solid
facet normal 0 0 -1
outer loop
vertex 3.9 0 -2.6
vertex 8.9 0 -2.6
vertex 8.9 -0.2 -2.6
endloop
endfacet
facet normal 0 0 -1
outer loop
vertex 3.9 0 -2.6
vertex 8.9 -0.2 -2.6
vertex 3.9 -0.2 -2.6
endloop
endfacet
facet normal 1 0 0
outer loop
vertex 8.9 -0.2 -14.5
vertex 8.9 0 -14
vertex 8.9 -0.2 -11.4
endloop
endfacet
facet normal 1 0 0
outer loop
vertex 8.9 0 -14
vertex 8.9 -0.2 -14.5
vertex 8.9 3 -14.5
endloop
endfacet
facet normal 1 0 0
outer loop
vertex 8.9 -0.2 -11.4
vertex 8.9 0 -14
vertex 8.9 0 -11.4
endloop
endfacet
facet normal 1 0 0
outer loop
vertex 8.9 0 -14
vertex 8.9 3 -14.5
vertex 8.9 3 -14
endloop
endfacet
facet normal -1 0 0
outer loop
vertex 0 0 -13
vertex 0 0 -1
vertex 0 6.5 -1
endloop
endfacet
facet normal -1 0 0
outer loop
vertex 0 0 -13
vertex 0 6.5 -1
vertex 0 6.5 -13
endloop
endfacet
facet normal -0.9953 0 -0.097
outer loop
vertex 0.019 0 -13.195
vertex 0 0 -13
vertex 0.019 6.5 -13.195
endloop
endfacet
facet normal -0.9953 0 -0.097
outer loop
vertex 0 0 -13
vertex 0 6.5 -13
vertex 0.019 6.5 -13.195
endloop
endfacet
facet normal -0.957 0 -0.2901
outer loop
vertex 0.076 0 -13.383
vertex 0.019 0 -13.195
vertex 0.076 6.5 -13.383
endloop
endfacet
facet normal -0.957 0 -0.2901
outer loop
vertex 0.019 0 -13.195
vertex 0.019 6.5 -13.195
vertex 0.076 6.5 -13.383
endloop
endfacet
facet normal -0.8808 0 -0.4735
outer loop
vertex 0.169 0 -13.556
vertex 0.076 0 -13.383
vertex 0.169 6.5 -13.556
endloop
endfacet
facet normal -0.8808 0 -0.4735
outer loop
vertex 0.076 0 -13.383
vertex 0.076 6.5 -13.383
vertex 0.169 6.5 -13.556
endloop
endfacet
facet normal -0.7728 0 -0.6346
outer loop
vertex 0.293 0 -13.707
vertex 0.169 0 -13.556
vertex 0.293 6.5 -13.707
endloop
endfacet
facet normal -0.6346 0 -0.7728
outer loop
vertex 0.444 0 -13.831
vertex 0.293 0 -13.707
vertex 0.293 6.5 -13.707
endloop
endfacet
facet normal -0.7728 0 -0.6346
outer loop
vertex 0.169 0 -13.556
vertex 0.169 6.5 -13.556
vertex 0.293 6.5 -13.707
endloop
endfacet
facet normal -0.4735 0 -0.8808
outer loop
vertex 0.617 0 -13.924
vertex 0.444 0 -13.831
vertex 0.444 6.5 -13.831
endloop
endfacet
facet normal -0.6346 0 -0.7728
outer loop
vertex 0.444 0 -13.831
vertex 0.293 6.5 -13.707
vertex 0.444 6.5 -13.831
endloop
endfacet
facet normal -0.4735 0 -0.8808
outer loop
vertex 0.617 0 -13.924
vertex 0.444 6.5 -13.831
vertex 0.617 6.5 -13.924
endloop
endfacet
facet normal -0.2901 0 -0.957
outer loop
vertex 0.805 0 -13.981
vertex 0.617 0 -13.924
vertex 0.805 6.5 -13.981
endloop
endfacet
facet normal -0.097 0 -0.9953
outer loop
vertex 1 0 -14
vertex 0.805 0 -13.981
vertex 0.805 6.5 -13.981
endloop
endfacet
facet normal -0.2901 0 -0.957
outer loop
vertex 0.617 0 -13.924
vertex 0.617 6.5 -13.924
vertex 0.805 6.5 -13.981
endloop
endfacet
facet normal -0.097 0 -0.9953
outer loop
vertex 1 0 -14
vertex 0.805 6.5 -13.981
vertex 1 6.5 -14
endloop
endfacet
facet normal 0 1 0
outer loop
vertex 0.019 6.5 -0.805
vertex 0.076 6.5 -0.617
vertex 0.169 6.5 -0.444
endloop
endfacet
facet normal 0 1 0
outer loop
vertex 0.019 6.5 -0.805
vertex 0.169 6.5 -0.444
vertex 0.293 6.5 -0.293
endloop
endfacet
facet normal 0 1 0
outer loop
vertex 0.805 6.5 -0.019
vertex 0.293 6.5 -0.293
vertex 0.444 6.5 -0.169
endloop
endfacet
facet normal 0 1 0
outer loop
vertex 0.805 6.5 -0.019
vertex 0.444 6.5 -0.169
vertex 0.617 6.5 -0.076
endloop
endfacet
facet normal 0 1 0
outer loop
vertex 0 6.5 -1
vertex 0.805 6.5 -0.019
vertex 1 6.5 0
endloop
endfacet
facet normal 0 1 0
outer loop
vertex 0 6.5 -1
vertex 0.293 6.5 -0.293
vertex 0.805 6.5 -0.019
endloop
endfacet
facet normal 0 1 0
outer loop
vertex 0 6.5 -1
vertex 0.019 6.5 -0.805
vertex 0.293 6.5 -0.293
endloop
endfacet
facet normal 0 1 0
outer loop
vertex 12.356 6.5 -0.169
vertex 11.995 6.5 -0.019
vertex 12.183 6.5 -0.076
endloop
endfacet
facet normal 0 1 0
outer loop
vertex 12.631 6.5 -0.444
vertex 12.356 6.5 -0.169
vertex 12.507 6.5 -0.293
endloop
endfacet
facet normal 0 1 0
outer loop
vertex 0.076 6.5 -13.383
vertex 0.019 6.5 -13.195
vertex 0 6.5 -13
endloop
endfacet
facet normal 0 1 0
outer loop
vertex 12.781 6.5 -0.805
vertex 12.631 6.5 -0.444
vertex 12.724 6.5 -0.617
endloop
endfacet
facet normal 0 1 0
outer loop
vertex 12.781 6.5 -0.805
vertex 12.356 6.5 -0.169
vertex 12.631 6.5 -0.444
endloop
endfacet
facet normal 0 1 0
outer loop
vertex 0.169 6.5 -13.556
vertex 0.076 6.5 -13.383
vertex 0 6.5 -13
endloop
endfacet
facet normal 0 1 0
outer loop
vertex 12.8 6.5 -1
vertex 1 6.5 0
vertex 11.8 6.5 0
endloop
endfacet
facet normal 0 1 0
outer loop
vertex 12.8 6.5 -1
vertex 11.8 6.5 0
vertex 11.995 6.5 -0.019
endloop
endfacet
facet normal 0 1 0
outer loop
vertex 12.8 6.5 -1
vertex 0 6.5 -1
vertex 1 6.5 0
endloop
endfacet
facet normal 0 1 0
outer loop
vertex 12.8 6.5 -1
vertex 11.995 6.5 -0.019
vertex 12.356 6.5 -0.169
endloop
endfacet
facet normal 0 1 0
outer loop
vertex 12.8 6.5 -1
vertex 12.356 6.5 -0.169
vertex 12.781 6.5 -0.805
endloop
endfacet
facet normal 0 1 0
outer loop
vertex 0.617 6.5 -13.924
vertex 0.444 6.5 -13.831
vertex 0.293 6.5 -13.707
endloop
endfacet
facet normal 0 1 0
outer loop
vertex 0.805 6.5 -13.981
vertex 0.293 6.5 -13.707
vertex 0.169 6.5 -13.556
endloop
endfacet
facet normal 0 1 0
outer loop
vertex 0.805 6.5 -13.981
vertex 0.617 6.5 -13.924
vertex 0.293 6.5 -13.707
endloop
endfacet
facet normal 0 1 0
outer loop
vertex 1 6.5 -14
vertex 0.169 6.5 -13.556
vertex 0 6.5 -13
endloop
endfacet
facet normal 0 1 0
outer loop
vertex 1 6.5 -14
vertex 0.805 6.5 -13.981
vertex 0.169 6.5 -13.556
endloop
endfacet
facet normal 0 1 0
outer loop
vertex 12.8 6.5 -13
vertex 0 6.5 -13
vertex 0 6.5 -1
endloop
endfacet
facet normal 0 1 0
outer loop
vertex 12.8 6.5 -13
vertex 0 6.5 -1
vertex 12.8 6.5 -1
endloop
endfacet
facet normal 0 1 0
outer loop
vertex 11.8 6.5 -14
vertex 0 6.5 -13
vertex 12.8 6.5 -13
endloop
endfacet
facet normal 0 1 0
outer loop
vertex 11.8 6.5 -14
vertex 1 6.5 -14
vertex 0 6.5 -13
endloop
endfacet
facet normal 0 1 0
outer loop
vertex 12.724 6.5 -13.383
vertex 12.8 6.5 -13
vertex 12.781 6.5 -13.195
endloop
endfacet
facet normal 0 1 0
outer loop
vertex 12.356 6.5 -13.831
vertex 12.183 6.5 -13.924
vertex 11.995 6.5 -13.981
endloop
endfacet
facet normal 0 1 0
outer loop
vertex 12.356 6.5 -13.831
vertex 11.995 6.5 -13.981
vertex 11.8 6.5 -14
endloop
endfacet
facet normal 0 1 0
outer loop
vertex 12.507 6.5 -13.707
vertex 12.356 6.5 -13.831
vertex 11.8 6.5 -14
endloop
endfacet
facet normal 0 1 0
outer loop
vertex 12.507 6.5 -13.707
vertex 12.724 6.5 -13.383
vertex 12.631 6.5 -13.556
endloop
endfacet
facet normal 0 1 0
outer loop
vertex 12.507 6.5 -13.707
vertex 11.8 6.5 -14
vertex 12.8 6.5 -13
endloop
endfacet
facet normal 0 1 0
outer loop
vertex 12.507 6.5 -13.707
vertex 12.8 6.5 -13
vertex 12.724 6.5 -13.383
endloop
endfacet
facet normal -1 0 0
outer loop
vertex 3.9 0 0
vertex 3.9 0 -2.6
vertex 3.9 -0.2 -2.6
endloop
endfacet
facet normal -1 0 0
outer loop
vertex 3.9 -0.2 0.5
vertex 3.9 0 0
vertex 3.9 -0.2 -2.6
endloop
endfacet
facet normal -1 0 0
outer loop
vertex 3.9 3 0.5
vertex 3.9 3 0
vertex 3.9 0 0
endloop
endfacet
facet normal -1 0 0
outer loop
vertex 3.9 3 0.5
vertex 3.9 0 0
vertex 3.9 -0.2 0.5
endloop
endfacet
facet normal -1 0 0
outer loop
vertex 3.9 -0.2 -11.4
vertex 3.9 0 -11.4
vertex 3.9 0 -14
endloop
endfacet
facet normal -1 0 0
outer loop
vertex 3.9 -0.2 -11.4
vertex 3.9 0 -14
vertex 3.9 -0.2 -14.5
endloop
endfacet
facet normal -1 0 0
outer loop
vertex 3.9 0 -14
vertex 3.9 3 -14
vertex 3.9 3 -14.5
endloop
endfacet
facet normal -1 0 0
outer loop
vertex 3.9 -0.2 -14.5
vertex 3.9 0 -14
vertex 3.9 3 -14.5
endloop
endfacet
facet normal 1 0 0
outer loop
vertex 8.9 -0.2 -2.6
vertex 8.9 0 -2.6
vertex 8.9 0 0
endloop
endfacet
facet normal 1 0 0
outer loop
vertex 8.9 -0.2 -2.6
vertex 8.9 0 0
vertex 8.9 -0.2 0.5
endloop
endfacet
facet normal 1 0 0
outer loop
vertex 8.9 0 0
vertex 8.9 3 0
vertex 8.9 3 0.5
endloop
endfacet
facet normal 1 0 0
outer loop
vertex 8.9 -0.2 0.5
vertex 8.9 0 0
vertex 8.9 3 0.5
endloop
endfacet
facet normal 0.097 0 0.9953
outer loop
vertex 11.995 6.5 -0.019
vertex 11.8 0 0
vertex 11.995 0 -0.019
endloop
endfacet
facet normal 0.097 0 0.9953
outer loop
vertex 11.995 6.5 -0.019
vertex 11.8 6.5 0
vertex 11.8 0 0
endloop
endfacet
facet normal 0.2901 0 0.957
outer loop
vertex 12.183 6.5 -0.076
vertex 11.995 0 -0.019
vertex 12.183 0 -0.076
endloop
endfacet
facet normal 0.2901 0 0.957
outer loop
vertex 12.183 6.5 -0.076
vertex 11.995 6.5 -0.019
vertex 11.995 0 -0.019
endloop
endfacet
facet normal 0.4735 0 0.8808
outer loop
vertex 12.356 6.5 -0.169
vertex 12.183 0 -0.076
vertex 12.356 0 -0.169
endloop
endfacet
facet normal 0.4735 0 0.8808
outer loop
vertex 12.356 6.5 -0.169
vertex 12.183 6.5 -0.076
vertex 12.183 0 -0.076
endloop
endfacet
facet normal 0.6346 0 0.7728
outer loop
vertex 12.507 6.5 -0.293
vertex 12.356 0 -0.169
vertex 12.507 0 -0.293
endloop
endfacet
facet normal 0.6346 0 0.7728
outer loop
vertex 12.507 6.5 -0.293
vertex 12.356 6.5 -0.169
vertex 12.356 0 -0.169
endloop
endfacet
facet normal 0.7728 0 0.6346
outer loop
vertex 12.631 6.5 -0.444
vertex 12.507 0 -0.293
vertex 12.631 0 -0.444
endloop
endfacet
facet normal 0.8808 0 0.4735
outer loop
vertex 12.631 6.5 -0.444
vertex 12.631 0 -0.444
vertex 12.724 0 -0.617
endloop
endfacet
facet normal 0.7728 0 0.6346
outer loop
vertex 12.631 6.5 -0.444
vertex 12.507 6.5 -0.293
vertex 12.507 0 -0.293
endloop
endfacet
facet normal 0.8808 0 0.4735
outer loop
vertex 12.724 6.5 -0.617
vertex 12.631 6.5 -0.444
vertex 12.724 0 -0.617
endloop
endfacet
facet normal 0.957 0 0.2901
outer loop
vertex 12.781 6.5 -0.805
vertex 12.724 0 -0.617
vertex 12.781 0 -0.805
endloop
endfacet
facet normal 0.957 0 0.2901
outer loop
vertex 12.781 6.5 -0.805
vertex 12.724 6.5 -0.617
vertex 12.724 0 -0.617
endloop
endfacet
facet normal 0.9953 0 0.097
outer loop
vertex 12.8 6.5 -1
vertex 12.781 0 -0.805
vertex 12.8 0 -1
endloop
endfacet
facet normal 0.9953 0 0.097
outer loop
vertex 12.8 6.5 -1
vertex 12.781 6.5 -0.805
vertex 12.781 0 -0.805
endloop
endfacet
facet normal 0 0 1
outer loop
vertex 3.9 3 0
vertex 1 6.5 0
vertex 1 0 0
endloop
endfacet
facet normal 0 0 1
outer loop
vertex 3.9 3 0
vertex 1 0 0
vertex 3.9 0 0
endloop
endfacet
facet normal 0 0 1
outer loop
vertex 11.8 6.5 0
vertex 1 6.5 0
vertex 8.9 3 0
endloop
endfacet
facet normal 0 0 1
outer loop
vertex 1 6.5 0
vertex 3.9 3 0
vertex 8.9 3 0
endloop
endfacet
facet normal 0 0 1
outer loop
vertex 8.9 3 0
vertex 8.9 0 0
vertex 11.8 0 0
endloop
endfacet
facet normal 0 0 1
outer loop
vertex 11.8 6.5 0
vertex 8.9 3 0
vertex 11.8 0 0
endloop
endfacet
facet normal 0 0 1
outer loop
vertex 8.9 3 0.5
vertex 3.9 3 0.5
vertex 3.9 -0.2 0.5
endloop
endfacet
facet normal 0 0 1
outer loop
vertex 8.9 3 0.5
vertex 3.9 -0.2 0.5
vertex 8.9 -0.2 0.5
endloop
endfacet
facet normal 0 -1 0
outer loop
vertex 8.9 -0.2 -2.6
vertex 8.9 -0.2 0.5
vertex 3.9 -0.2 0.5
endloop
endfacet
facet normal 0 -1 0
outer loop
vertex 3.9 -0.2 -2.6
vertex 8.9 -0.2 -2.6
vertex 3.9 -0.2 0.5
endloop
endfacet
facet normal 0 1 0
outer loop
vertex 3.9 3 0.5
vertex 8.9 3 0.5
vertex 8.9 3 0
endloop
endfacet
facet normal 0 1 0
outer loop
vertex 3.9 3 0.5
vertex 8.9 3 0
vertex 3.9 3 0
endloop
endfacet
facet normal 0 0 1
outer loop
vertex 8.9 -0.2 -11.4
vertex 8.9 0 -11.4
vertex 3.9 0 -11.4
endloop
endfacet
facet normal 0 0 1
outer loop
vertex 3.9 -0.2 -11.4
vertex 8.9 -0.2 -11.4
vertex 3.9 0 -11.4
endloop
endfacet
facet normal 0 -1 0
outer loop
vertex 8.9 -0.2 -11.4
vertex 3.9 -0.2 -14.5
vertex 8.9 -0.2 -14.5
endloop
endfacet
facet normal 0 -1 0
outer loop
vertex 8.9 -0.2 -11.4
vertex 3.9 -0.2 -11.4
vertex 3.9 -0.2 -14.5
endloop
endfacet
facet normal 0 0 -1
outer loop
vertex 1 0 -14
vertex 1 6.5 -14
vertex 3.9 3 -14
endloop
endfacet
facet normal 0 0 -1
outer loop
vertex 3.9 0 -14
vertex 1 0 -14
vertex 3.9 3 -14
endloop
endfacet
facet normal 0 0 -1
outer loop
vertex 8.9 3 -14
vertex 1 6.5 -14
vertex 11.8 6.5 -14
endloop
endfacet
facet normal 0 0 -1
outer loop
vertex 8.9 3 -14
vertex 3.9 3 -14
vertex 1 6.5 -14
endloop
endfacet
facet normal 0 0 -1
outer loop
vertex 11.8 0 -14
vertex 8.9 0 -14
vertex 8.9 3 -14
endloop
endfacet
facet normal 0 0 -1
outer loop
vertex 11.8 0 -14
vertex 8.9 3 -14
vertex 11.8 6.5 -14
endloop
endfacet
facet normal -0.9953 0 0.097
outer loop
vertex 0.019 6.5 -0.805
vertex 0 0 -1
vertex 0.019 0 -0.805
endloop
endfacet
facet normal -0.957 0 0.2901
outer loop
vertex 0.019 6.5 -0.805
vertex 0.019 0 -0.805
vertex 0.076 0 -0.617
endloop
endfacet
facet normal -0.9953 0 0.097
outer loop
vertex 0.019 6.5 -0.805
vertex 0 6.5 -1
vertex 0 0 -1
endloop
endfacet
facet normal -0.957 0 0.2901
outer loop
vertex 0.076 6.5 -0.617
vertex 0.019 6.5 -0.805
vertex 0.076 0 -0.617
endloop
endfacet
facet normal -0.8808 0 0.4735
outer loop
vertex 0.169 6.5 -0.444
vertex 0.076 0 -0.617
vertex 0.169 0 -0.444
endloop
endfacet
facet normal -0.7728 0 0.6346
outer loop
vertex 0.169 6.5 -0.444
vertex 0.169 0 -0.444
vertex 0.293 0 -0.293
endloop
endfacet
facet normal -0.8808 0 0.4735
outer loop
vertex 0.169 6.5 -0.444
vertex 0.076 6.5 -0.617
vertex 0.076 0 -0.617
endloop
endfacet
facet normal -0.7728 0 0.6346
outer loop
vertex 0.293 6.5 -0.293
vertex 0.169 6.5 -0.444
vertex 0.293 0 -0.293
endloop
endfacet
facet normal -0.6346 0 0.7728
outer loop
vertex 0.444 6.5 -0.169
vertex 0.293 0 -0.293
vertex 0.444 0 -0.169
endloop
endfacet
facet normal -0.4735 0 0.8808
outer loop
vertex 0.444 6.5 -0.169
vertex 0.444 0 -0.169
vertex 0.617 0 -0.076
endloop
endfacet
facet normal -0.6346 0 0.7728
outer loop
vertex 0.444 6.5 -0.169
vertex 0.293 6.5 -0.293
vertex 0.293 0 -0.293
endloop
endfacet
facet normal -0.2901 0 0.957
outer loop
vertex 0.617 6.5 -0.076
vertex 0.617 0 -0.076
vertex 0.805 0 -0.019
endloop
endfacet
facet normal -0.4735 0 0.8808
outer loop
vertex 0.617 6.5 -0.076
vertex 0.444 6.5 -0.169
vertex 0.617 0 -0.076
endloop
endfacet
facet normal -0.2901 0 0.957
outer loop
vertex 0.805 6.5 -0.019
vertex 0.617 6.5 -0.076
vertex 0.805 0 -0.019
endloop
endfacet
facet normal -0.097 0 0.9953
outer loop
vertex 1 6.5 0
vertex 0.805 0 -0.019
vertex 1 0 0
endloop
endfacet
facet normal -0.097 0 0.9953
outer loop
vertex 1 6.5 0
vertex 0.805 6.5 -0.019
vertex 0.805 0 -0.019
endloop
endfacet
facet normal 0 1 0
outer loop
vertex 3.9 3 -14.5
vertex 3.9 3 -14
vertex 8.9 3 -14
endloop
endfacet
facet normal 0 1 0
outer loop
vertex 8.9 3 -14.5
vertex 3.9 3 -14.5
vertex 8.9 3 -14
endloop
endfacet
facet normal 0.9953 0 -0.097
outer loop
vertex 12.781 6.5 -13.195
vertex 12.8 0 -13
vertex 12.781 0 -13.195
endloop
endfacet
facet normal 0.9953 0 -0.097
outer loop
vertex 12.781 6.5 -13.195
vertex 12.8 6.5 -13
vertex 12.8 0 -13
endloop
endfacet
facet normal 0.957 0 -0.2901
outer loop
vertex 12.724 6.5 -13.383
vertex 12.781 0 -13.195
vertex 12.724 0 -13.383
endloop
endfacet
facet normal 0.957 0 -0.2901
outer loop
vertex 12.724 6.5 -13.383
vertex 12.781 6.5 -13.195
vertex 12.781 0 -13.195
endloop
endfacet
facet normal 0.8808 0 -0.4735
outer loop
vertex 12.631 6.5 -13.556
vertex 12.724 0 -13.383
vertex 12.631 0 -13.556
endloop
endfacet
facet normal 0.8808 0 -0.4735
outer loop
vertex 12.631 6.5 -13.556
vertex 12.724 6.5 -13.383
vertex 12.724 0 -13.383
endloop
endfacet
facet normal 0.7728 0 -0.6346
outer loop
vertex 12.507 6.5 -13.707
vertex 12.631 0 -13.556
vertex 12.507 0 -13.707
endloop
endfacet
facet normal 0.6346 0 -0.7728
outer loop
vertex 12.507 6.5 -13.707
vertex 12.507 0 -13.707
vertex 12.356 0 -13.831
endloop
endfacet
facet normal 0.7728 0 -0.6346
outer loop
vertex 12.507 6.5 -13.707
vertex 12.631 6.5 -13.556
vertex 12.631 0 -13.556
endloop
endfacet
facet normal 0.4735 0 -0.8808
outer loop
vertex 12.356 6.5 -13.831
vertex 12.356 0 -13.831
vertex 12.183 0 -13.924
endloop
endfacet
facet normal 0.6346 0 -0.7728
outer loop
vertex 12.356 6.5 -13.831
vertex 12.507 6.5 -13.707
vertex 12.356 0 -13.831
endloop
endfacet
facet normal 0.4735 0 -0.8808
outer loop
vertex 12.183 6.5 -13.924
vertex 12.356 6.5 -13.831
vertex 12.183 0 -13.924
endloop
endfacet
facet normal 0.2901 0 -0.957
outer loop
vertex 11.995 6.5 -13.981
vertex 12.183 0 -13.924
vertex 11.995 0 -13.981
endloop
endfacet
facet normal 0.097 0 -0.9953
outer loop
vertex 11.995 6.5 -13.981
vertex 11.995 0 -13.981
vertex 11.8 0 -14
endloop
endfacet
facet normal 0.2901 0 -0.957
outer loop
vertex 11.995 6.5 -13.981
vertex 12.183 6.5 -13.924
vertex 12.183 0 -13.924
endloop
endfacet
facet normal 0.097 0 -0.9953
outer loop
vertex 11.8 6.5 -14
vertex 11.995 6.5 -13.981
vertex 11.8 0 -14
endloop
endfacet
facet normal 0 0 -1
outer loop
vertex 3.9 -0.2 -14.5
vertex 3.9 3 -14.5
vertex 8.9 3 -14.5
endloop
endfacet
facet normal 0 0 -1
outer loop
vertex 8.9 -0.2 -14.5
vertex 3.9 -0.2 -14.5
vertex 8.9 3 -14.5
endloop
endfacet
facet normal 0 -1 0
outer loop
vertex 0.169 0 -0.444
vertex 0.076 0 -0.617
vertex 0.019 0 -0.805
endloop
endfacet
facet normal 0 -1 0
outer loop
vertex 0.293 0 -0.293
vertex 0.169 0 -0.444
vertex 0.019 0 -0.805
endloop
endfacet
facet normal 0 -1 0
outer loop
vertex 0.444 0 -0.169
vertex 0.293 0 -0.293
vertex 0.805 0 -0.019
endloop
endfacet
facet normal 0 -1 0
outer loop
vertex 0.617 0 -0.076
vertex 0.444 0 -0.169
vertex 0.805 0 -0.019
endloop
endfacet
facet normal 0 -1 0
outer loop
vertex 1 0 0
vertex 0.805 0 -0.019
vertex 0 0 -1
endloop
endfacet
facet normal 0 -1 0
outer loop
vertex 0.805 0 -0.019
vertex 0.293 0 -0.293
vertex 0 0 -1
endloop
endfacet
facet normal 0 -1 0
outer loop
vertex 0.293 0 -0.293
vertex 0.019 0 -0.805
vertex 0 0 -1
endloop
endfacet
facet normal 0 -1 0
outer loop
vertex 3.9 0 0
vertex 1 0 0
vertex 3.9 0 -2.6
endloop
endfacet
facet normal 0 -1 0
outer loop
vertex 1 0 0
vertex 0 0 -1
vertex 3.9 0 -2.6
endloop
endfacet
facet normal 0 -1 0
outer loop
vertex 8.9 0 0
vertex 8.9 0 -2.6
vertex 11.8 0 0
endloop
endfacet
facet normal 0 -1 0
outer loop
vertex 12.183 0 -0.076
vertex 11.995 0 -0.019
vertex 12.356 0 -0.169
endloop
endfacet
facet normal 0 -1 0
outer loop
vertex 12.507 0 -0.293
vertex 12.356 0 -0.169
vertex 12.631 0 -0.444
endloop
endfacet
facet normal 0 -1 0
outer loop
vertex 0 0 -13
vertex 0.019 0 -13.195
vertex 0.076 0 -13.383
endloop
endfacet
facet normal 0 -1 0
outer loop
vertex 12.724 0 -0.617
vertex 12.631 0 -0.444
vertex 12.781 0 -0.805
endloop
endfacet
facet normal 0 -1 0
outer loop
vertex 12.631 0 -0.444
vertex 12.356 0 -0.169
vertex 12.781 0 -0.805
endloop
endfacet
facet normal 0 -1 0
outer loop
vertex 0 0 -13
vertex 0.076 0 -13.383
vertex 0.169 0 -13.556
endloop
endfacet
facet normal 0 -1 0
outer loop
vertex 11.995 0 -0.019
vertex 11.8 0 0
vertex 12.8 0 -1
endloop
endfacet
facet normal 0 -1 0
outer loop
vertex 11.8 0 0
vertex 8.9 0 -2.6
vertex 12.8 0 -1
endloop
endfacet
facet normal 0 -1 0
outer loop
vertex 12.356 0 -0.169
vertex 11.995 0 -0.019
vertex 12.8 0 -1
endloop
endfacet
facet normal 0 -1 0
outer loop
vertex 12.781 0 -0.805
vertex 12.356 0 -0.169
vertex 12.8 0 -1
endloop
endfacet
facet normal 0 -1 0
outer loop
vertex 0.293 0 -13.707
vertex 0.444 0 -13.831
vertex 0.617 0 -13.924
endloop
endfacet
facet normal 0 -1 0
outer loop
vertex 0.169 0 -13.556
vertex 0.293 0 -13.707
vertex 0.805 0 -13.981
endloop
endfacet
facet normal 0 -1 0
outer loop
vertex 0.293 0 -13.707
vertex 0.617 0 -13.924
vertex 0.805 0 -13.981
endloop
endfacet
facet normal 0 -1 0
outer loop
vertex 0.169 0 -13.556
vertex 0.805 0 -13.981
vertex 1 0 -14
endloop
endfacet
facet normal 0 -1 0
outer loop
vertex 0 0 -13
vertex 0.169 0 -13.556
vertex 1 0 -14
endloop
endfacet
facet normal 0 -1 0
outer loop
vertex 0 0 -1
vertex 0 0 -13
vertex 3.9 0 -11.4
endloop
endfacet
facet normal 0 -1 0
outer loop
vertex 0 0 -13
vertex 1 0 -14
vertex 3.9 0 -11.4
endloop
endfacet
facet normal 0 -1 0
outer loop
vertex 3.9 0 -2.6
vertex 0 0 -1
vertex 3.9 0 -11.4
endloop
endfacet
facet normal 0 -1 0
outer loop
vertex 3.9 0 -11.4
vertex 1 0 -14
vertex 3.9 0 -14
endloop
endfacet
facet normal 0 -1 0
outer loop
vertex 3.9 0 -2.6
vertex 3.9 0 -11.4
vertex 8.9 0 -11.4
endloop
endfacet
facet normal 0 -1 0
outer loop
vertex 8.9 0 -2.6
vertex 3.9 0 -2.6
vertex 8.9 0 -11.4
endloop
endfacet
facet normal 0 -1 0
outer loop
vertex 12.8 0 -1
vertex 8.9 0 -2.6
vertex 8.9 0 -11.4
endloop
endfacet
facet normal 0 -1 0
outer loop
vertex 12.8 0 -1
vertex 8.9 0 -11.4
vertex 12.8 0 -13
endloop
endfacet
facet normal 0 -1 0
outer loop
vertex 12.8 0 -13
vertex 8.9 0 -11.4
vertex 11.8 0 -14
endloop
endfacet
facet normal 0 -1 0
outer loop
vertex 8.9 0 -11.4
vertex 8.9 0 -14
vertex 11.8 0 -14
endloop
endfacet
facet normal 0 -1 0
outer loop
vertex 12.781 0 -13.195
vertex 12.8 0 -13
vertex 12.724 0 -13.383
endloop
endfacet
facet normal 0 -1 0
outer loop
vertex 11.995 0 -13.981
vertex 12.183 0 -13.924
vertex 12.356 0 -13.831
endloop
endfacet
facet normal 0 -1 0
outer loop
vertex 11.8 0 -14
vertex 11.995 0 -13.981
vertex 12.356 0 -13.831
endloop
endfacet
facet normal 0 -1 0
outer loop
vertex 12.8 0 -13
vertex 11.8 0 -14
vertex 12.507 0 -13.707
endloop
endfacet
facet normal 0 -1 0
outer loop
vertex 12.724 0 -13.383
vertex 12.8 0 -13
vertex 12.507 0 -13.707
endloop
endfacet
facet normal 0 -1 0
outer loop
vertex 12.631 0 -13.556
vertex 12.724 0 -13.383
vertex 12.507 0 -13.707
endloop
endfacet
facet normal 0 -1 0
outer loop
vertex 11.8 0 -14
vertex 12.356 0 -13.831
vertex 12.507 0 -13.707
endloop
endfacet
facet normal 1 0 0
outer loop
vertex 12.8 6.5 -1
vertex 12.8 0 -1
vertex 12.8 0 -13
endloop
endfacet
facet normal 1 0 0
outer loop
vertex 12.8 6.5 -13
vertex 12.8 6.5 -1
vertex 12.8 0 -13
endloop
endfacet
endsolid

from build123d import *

# Parameters (mm, degrees)
SKETCH1_W                = 12.8
SKETCH1_H                = 14
BOSS_EXTRUDE1_DEPTH      = 6.5
FILLET1_R                = 1
BOSS_EXTRUDE2_DEPTH      = 0.2
BOSS_EXTRUDE2_DEPTH_BACK = 3


with BuildPart() as part:
    # Sketch1 → Boss-Extrude1 (new body)
    with BuildSketch(Plane(origin=(0, 0, 0), x_dir=(1, 0, 0), z_dir=(0, 1, 0))):
        with Locations((6.4, 7)):
            Rectangle(SKETCH1_W, SKETCH1_H)
    extrude(amount=BOSS_EXTRUDE1_DEPTH)

    # Fillet1
    fillet1_edges = [part.edges().sort_by_distance(p)[0] for p in [
        (0, 3.25, 0),
        (0, 3.25, -14),
        (12.8, 3.25, -14),
        (12.8, 3.25, 0),
    ]]
    fillet(fillet1_edges, radius=FILLET1_R)

    # Sketch2 → Boss-Extrude2 (add, two sides: drawn at the far end of the back side and taken through both)
    with BuildSketch(Plane.XZ.offset(-BOSS_EXTRUDE2_DEPTH_BACK)):
        Polygon((8.9, 0), (8.9, -2.6), (3.9, -2.6), (3.9, 0.5), (8.9, 0.5), align=None)
        Polygon((3.9, -14.5), (8.9, -14.5), (8.9, -14), (8.9, -11.4), (3.9, -11.4), align=None)
    extrude(amount=BOSS_EXTRUDE2_DEPTH + BOSS_EXTRUDE2_DEPTH_BACK)


solid = part.part
